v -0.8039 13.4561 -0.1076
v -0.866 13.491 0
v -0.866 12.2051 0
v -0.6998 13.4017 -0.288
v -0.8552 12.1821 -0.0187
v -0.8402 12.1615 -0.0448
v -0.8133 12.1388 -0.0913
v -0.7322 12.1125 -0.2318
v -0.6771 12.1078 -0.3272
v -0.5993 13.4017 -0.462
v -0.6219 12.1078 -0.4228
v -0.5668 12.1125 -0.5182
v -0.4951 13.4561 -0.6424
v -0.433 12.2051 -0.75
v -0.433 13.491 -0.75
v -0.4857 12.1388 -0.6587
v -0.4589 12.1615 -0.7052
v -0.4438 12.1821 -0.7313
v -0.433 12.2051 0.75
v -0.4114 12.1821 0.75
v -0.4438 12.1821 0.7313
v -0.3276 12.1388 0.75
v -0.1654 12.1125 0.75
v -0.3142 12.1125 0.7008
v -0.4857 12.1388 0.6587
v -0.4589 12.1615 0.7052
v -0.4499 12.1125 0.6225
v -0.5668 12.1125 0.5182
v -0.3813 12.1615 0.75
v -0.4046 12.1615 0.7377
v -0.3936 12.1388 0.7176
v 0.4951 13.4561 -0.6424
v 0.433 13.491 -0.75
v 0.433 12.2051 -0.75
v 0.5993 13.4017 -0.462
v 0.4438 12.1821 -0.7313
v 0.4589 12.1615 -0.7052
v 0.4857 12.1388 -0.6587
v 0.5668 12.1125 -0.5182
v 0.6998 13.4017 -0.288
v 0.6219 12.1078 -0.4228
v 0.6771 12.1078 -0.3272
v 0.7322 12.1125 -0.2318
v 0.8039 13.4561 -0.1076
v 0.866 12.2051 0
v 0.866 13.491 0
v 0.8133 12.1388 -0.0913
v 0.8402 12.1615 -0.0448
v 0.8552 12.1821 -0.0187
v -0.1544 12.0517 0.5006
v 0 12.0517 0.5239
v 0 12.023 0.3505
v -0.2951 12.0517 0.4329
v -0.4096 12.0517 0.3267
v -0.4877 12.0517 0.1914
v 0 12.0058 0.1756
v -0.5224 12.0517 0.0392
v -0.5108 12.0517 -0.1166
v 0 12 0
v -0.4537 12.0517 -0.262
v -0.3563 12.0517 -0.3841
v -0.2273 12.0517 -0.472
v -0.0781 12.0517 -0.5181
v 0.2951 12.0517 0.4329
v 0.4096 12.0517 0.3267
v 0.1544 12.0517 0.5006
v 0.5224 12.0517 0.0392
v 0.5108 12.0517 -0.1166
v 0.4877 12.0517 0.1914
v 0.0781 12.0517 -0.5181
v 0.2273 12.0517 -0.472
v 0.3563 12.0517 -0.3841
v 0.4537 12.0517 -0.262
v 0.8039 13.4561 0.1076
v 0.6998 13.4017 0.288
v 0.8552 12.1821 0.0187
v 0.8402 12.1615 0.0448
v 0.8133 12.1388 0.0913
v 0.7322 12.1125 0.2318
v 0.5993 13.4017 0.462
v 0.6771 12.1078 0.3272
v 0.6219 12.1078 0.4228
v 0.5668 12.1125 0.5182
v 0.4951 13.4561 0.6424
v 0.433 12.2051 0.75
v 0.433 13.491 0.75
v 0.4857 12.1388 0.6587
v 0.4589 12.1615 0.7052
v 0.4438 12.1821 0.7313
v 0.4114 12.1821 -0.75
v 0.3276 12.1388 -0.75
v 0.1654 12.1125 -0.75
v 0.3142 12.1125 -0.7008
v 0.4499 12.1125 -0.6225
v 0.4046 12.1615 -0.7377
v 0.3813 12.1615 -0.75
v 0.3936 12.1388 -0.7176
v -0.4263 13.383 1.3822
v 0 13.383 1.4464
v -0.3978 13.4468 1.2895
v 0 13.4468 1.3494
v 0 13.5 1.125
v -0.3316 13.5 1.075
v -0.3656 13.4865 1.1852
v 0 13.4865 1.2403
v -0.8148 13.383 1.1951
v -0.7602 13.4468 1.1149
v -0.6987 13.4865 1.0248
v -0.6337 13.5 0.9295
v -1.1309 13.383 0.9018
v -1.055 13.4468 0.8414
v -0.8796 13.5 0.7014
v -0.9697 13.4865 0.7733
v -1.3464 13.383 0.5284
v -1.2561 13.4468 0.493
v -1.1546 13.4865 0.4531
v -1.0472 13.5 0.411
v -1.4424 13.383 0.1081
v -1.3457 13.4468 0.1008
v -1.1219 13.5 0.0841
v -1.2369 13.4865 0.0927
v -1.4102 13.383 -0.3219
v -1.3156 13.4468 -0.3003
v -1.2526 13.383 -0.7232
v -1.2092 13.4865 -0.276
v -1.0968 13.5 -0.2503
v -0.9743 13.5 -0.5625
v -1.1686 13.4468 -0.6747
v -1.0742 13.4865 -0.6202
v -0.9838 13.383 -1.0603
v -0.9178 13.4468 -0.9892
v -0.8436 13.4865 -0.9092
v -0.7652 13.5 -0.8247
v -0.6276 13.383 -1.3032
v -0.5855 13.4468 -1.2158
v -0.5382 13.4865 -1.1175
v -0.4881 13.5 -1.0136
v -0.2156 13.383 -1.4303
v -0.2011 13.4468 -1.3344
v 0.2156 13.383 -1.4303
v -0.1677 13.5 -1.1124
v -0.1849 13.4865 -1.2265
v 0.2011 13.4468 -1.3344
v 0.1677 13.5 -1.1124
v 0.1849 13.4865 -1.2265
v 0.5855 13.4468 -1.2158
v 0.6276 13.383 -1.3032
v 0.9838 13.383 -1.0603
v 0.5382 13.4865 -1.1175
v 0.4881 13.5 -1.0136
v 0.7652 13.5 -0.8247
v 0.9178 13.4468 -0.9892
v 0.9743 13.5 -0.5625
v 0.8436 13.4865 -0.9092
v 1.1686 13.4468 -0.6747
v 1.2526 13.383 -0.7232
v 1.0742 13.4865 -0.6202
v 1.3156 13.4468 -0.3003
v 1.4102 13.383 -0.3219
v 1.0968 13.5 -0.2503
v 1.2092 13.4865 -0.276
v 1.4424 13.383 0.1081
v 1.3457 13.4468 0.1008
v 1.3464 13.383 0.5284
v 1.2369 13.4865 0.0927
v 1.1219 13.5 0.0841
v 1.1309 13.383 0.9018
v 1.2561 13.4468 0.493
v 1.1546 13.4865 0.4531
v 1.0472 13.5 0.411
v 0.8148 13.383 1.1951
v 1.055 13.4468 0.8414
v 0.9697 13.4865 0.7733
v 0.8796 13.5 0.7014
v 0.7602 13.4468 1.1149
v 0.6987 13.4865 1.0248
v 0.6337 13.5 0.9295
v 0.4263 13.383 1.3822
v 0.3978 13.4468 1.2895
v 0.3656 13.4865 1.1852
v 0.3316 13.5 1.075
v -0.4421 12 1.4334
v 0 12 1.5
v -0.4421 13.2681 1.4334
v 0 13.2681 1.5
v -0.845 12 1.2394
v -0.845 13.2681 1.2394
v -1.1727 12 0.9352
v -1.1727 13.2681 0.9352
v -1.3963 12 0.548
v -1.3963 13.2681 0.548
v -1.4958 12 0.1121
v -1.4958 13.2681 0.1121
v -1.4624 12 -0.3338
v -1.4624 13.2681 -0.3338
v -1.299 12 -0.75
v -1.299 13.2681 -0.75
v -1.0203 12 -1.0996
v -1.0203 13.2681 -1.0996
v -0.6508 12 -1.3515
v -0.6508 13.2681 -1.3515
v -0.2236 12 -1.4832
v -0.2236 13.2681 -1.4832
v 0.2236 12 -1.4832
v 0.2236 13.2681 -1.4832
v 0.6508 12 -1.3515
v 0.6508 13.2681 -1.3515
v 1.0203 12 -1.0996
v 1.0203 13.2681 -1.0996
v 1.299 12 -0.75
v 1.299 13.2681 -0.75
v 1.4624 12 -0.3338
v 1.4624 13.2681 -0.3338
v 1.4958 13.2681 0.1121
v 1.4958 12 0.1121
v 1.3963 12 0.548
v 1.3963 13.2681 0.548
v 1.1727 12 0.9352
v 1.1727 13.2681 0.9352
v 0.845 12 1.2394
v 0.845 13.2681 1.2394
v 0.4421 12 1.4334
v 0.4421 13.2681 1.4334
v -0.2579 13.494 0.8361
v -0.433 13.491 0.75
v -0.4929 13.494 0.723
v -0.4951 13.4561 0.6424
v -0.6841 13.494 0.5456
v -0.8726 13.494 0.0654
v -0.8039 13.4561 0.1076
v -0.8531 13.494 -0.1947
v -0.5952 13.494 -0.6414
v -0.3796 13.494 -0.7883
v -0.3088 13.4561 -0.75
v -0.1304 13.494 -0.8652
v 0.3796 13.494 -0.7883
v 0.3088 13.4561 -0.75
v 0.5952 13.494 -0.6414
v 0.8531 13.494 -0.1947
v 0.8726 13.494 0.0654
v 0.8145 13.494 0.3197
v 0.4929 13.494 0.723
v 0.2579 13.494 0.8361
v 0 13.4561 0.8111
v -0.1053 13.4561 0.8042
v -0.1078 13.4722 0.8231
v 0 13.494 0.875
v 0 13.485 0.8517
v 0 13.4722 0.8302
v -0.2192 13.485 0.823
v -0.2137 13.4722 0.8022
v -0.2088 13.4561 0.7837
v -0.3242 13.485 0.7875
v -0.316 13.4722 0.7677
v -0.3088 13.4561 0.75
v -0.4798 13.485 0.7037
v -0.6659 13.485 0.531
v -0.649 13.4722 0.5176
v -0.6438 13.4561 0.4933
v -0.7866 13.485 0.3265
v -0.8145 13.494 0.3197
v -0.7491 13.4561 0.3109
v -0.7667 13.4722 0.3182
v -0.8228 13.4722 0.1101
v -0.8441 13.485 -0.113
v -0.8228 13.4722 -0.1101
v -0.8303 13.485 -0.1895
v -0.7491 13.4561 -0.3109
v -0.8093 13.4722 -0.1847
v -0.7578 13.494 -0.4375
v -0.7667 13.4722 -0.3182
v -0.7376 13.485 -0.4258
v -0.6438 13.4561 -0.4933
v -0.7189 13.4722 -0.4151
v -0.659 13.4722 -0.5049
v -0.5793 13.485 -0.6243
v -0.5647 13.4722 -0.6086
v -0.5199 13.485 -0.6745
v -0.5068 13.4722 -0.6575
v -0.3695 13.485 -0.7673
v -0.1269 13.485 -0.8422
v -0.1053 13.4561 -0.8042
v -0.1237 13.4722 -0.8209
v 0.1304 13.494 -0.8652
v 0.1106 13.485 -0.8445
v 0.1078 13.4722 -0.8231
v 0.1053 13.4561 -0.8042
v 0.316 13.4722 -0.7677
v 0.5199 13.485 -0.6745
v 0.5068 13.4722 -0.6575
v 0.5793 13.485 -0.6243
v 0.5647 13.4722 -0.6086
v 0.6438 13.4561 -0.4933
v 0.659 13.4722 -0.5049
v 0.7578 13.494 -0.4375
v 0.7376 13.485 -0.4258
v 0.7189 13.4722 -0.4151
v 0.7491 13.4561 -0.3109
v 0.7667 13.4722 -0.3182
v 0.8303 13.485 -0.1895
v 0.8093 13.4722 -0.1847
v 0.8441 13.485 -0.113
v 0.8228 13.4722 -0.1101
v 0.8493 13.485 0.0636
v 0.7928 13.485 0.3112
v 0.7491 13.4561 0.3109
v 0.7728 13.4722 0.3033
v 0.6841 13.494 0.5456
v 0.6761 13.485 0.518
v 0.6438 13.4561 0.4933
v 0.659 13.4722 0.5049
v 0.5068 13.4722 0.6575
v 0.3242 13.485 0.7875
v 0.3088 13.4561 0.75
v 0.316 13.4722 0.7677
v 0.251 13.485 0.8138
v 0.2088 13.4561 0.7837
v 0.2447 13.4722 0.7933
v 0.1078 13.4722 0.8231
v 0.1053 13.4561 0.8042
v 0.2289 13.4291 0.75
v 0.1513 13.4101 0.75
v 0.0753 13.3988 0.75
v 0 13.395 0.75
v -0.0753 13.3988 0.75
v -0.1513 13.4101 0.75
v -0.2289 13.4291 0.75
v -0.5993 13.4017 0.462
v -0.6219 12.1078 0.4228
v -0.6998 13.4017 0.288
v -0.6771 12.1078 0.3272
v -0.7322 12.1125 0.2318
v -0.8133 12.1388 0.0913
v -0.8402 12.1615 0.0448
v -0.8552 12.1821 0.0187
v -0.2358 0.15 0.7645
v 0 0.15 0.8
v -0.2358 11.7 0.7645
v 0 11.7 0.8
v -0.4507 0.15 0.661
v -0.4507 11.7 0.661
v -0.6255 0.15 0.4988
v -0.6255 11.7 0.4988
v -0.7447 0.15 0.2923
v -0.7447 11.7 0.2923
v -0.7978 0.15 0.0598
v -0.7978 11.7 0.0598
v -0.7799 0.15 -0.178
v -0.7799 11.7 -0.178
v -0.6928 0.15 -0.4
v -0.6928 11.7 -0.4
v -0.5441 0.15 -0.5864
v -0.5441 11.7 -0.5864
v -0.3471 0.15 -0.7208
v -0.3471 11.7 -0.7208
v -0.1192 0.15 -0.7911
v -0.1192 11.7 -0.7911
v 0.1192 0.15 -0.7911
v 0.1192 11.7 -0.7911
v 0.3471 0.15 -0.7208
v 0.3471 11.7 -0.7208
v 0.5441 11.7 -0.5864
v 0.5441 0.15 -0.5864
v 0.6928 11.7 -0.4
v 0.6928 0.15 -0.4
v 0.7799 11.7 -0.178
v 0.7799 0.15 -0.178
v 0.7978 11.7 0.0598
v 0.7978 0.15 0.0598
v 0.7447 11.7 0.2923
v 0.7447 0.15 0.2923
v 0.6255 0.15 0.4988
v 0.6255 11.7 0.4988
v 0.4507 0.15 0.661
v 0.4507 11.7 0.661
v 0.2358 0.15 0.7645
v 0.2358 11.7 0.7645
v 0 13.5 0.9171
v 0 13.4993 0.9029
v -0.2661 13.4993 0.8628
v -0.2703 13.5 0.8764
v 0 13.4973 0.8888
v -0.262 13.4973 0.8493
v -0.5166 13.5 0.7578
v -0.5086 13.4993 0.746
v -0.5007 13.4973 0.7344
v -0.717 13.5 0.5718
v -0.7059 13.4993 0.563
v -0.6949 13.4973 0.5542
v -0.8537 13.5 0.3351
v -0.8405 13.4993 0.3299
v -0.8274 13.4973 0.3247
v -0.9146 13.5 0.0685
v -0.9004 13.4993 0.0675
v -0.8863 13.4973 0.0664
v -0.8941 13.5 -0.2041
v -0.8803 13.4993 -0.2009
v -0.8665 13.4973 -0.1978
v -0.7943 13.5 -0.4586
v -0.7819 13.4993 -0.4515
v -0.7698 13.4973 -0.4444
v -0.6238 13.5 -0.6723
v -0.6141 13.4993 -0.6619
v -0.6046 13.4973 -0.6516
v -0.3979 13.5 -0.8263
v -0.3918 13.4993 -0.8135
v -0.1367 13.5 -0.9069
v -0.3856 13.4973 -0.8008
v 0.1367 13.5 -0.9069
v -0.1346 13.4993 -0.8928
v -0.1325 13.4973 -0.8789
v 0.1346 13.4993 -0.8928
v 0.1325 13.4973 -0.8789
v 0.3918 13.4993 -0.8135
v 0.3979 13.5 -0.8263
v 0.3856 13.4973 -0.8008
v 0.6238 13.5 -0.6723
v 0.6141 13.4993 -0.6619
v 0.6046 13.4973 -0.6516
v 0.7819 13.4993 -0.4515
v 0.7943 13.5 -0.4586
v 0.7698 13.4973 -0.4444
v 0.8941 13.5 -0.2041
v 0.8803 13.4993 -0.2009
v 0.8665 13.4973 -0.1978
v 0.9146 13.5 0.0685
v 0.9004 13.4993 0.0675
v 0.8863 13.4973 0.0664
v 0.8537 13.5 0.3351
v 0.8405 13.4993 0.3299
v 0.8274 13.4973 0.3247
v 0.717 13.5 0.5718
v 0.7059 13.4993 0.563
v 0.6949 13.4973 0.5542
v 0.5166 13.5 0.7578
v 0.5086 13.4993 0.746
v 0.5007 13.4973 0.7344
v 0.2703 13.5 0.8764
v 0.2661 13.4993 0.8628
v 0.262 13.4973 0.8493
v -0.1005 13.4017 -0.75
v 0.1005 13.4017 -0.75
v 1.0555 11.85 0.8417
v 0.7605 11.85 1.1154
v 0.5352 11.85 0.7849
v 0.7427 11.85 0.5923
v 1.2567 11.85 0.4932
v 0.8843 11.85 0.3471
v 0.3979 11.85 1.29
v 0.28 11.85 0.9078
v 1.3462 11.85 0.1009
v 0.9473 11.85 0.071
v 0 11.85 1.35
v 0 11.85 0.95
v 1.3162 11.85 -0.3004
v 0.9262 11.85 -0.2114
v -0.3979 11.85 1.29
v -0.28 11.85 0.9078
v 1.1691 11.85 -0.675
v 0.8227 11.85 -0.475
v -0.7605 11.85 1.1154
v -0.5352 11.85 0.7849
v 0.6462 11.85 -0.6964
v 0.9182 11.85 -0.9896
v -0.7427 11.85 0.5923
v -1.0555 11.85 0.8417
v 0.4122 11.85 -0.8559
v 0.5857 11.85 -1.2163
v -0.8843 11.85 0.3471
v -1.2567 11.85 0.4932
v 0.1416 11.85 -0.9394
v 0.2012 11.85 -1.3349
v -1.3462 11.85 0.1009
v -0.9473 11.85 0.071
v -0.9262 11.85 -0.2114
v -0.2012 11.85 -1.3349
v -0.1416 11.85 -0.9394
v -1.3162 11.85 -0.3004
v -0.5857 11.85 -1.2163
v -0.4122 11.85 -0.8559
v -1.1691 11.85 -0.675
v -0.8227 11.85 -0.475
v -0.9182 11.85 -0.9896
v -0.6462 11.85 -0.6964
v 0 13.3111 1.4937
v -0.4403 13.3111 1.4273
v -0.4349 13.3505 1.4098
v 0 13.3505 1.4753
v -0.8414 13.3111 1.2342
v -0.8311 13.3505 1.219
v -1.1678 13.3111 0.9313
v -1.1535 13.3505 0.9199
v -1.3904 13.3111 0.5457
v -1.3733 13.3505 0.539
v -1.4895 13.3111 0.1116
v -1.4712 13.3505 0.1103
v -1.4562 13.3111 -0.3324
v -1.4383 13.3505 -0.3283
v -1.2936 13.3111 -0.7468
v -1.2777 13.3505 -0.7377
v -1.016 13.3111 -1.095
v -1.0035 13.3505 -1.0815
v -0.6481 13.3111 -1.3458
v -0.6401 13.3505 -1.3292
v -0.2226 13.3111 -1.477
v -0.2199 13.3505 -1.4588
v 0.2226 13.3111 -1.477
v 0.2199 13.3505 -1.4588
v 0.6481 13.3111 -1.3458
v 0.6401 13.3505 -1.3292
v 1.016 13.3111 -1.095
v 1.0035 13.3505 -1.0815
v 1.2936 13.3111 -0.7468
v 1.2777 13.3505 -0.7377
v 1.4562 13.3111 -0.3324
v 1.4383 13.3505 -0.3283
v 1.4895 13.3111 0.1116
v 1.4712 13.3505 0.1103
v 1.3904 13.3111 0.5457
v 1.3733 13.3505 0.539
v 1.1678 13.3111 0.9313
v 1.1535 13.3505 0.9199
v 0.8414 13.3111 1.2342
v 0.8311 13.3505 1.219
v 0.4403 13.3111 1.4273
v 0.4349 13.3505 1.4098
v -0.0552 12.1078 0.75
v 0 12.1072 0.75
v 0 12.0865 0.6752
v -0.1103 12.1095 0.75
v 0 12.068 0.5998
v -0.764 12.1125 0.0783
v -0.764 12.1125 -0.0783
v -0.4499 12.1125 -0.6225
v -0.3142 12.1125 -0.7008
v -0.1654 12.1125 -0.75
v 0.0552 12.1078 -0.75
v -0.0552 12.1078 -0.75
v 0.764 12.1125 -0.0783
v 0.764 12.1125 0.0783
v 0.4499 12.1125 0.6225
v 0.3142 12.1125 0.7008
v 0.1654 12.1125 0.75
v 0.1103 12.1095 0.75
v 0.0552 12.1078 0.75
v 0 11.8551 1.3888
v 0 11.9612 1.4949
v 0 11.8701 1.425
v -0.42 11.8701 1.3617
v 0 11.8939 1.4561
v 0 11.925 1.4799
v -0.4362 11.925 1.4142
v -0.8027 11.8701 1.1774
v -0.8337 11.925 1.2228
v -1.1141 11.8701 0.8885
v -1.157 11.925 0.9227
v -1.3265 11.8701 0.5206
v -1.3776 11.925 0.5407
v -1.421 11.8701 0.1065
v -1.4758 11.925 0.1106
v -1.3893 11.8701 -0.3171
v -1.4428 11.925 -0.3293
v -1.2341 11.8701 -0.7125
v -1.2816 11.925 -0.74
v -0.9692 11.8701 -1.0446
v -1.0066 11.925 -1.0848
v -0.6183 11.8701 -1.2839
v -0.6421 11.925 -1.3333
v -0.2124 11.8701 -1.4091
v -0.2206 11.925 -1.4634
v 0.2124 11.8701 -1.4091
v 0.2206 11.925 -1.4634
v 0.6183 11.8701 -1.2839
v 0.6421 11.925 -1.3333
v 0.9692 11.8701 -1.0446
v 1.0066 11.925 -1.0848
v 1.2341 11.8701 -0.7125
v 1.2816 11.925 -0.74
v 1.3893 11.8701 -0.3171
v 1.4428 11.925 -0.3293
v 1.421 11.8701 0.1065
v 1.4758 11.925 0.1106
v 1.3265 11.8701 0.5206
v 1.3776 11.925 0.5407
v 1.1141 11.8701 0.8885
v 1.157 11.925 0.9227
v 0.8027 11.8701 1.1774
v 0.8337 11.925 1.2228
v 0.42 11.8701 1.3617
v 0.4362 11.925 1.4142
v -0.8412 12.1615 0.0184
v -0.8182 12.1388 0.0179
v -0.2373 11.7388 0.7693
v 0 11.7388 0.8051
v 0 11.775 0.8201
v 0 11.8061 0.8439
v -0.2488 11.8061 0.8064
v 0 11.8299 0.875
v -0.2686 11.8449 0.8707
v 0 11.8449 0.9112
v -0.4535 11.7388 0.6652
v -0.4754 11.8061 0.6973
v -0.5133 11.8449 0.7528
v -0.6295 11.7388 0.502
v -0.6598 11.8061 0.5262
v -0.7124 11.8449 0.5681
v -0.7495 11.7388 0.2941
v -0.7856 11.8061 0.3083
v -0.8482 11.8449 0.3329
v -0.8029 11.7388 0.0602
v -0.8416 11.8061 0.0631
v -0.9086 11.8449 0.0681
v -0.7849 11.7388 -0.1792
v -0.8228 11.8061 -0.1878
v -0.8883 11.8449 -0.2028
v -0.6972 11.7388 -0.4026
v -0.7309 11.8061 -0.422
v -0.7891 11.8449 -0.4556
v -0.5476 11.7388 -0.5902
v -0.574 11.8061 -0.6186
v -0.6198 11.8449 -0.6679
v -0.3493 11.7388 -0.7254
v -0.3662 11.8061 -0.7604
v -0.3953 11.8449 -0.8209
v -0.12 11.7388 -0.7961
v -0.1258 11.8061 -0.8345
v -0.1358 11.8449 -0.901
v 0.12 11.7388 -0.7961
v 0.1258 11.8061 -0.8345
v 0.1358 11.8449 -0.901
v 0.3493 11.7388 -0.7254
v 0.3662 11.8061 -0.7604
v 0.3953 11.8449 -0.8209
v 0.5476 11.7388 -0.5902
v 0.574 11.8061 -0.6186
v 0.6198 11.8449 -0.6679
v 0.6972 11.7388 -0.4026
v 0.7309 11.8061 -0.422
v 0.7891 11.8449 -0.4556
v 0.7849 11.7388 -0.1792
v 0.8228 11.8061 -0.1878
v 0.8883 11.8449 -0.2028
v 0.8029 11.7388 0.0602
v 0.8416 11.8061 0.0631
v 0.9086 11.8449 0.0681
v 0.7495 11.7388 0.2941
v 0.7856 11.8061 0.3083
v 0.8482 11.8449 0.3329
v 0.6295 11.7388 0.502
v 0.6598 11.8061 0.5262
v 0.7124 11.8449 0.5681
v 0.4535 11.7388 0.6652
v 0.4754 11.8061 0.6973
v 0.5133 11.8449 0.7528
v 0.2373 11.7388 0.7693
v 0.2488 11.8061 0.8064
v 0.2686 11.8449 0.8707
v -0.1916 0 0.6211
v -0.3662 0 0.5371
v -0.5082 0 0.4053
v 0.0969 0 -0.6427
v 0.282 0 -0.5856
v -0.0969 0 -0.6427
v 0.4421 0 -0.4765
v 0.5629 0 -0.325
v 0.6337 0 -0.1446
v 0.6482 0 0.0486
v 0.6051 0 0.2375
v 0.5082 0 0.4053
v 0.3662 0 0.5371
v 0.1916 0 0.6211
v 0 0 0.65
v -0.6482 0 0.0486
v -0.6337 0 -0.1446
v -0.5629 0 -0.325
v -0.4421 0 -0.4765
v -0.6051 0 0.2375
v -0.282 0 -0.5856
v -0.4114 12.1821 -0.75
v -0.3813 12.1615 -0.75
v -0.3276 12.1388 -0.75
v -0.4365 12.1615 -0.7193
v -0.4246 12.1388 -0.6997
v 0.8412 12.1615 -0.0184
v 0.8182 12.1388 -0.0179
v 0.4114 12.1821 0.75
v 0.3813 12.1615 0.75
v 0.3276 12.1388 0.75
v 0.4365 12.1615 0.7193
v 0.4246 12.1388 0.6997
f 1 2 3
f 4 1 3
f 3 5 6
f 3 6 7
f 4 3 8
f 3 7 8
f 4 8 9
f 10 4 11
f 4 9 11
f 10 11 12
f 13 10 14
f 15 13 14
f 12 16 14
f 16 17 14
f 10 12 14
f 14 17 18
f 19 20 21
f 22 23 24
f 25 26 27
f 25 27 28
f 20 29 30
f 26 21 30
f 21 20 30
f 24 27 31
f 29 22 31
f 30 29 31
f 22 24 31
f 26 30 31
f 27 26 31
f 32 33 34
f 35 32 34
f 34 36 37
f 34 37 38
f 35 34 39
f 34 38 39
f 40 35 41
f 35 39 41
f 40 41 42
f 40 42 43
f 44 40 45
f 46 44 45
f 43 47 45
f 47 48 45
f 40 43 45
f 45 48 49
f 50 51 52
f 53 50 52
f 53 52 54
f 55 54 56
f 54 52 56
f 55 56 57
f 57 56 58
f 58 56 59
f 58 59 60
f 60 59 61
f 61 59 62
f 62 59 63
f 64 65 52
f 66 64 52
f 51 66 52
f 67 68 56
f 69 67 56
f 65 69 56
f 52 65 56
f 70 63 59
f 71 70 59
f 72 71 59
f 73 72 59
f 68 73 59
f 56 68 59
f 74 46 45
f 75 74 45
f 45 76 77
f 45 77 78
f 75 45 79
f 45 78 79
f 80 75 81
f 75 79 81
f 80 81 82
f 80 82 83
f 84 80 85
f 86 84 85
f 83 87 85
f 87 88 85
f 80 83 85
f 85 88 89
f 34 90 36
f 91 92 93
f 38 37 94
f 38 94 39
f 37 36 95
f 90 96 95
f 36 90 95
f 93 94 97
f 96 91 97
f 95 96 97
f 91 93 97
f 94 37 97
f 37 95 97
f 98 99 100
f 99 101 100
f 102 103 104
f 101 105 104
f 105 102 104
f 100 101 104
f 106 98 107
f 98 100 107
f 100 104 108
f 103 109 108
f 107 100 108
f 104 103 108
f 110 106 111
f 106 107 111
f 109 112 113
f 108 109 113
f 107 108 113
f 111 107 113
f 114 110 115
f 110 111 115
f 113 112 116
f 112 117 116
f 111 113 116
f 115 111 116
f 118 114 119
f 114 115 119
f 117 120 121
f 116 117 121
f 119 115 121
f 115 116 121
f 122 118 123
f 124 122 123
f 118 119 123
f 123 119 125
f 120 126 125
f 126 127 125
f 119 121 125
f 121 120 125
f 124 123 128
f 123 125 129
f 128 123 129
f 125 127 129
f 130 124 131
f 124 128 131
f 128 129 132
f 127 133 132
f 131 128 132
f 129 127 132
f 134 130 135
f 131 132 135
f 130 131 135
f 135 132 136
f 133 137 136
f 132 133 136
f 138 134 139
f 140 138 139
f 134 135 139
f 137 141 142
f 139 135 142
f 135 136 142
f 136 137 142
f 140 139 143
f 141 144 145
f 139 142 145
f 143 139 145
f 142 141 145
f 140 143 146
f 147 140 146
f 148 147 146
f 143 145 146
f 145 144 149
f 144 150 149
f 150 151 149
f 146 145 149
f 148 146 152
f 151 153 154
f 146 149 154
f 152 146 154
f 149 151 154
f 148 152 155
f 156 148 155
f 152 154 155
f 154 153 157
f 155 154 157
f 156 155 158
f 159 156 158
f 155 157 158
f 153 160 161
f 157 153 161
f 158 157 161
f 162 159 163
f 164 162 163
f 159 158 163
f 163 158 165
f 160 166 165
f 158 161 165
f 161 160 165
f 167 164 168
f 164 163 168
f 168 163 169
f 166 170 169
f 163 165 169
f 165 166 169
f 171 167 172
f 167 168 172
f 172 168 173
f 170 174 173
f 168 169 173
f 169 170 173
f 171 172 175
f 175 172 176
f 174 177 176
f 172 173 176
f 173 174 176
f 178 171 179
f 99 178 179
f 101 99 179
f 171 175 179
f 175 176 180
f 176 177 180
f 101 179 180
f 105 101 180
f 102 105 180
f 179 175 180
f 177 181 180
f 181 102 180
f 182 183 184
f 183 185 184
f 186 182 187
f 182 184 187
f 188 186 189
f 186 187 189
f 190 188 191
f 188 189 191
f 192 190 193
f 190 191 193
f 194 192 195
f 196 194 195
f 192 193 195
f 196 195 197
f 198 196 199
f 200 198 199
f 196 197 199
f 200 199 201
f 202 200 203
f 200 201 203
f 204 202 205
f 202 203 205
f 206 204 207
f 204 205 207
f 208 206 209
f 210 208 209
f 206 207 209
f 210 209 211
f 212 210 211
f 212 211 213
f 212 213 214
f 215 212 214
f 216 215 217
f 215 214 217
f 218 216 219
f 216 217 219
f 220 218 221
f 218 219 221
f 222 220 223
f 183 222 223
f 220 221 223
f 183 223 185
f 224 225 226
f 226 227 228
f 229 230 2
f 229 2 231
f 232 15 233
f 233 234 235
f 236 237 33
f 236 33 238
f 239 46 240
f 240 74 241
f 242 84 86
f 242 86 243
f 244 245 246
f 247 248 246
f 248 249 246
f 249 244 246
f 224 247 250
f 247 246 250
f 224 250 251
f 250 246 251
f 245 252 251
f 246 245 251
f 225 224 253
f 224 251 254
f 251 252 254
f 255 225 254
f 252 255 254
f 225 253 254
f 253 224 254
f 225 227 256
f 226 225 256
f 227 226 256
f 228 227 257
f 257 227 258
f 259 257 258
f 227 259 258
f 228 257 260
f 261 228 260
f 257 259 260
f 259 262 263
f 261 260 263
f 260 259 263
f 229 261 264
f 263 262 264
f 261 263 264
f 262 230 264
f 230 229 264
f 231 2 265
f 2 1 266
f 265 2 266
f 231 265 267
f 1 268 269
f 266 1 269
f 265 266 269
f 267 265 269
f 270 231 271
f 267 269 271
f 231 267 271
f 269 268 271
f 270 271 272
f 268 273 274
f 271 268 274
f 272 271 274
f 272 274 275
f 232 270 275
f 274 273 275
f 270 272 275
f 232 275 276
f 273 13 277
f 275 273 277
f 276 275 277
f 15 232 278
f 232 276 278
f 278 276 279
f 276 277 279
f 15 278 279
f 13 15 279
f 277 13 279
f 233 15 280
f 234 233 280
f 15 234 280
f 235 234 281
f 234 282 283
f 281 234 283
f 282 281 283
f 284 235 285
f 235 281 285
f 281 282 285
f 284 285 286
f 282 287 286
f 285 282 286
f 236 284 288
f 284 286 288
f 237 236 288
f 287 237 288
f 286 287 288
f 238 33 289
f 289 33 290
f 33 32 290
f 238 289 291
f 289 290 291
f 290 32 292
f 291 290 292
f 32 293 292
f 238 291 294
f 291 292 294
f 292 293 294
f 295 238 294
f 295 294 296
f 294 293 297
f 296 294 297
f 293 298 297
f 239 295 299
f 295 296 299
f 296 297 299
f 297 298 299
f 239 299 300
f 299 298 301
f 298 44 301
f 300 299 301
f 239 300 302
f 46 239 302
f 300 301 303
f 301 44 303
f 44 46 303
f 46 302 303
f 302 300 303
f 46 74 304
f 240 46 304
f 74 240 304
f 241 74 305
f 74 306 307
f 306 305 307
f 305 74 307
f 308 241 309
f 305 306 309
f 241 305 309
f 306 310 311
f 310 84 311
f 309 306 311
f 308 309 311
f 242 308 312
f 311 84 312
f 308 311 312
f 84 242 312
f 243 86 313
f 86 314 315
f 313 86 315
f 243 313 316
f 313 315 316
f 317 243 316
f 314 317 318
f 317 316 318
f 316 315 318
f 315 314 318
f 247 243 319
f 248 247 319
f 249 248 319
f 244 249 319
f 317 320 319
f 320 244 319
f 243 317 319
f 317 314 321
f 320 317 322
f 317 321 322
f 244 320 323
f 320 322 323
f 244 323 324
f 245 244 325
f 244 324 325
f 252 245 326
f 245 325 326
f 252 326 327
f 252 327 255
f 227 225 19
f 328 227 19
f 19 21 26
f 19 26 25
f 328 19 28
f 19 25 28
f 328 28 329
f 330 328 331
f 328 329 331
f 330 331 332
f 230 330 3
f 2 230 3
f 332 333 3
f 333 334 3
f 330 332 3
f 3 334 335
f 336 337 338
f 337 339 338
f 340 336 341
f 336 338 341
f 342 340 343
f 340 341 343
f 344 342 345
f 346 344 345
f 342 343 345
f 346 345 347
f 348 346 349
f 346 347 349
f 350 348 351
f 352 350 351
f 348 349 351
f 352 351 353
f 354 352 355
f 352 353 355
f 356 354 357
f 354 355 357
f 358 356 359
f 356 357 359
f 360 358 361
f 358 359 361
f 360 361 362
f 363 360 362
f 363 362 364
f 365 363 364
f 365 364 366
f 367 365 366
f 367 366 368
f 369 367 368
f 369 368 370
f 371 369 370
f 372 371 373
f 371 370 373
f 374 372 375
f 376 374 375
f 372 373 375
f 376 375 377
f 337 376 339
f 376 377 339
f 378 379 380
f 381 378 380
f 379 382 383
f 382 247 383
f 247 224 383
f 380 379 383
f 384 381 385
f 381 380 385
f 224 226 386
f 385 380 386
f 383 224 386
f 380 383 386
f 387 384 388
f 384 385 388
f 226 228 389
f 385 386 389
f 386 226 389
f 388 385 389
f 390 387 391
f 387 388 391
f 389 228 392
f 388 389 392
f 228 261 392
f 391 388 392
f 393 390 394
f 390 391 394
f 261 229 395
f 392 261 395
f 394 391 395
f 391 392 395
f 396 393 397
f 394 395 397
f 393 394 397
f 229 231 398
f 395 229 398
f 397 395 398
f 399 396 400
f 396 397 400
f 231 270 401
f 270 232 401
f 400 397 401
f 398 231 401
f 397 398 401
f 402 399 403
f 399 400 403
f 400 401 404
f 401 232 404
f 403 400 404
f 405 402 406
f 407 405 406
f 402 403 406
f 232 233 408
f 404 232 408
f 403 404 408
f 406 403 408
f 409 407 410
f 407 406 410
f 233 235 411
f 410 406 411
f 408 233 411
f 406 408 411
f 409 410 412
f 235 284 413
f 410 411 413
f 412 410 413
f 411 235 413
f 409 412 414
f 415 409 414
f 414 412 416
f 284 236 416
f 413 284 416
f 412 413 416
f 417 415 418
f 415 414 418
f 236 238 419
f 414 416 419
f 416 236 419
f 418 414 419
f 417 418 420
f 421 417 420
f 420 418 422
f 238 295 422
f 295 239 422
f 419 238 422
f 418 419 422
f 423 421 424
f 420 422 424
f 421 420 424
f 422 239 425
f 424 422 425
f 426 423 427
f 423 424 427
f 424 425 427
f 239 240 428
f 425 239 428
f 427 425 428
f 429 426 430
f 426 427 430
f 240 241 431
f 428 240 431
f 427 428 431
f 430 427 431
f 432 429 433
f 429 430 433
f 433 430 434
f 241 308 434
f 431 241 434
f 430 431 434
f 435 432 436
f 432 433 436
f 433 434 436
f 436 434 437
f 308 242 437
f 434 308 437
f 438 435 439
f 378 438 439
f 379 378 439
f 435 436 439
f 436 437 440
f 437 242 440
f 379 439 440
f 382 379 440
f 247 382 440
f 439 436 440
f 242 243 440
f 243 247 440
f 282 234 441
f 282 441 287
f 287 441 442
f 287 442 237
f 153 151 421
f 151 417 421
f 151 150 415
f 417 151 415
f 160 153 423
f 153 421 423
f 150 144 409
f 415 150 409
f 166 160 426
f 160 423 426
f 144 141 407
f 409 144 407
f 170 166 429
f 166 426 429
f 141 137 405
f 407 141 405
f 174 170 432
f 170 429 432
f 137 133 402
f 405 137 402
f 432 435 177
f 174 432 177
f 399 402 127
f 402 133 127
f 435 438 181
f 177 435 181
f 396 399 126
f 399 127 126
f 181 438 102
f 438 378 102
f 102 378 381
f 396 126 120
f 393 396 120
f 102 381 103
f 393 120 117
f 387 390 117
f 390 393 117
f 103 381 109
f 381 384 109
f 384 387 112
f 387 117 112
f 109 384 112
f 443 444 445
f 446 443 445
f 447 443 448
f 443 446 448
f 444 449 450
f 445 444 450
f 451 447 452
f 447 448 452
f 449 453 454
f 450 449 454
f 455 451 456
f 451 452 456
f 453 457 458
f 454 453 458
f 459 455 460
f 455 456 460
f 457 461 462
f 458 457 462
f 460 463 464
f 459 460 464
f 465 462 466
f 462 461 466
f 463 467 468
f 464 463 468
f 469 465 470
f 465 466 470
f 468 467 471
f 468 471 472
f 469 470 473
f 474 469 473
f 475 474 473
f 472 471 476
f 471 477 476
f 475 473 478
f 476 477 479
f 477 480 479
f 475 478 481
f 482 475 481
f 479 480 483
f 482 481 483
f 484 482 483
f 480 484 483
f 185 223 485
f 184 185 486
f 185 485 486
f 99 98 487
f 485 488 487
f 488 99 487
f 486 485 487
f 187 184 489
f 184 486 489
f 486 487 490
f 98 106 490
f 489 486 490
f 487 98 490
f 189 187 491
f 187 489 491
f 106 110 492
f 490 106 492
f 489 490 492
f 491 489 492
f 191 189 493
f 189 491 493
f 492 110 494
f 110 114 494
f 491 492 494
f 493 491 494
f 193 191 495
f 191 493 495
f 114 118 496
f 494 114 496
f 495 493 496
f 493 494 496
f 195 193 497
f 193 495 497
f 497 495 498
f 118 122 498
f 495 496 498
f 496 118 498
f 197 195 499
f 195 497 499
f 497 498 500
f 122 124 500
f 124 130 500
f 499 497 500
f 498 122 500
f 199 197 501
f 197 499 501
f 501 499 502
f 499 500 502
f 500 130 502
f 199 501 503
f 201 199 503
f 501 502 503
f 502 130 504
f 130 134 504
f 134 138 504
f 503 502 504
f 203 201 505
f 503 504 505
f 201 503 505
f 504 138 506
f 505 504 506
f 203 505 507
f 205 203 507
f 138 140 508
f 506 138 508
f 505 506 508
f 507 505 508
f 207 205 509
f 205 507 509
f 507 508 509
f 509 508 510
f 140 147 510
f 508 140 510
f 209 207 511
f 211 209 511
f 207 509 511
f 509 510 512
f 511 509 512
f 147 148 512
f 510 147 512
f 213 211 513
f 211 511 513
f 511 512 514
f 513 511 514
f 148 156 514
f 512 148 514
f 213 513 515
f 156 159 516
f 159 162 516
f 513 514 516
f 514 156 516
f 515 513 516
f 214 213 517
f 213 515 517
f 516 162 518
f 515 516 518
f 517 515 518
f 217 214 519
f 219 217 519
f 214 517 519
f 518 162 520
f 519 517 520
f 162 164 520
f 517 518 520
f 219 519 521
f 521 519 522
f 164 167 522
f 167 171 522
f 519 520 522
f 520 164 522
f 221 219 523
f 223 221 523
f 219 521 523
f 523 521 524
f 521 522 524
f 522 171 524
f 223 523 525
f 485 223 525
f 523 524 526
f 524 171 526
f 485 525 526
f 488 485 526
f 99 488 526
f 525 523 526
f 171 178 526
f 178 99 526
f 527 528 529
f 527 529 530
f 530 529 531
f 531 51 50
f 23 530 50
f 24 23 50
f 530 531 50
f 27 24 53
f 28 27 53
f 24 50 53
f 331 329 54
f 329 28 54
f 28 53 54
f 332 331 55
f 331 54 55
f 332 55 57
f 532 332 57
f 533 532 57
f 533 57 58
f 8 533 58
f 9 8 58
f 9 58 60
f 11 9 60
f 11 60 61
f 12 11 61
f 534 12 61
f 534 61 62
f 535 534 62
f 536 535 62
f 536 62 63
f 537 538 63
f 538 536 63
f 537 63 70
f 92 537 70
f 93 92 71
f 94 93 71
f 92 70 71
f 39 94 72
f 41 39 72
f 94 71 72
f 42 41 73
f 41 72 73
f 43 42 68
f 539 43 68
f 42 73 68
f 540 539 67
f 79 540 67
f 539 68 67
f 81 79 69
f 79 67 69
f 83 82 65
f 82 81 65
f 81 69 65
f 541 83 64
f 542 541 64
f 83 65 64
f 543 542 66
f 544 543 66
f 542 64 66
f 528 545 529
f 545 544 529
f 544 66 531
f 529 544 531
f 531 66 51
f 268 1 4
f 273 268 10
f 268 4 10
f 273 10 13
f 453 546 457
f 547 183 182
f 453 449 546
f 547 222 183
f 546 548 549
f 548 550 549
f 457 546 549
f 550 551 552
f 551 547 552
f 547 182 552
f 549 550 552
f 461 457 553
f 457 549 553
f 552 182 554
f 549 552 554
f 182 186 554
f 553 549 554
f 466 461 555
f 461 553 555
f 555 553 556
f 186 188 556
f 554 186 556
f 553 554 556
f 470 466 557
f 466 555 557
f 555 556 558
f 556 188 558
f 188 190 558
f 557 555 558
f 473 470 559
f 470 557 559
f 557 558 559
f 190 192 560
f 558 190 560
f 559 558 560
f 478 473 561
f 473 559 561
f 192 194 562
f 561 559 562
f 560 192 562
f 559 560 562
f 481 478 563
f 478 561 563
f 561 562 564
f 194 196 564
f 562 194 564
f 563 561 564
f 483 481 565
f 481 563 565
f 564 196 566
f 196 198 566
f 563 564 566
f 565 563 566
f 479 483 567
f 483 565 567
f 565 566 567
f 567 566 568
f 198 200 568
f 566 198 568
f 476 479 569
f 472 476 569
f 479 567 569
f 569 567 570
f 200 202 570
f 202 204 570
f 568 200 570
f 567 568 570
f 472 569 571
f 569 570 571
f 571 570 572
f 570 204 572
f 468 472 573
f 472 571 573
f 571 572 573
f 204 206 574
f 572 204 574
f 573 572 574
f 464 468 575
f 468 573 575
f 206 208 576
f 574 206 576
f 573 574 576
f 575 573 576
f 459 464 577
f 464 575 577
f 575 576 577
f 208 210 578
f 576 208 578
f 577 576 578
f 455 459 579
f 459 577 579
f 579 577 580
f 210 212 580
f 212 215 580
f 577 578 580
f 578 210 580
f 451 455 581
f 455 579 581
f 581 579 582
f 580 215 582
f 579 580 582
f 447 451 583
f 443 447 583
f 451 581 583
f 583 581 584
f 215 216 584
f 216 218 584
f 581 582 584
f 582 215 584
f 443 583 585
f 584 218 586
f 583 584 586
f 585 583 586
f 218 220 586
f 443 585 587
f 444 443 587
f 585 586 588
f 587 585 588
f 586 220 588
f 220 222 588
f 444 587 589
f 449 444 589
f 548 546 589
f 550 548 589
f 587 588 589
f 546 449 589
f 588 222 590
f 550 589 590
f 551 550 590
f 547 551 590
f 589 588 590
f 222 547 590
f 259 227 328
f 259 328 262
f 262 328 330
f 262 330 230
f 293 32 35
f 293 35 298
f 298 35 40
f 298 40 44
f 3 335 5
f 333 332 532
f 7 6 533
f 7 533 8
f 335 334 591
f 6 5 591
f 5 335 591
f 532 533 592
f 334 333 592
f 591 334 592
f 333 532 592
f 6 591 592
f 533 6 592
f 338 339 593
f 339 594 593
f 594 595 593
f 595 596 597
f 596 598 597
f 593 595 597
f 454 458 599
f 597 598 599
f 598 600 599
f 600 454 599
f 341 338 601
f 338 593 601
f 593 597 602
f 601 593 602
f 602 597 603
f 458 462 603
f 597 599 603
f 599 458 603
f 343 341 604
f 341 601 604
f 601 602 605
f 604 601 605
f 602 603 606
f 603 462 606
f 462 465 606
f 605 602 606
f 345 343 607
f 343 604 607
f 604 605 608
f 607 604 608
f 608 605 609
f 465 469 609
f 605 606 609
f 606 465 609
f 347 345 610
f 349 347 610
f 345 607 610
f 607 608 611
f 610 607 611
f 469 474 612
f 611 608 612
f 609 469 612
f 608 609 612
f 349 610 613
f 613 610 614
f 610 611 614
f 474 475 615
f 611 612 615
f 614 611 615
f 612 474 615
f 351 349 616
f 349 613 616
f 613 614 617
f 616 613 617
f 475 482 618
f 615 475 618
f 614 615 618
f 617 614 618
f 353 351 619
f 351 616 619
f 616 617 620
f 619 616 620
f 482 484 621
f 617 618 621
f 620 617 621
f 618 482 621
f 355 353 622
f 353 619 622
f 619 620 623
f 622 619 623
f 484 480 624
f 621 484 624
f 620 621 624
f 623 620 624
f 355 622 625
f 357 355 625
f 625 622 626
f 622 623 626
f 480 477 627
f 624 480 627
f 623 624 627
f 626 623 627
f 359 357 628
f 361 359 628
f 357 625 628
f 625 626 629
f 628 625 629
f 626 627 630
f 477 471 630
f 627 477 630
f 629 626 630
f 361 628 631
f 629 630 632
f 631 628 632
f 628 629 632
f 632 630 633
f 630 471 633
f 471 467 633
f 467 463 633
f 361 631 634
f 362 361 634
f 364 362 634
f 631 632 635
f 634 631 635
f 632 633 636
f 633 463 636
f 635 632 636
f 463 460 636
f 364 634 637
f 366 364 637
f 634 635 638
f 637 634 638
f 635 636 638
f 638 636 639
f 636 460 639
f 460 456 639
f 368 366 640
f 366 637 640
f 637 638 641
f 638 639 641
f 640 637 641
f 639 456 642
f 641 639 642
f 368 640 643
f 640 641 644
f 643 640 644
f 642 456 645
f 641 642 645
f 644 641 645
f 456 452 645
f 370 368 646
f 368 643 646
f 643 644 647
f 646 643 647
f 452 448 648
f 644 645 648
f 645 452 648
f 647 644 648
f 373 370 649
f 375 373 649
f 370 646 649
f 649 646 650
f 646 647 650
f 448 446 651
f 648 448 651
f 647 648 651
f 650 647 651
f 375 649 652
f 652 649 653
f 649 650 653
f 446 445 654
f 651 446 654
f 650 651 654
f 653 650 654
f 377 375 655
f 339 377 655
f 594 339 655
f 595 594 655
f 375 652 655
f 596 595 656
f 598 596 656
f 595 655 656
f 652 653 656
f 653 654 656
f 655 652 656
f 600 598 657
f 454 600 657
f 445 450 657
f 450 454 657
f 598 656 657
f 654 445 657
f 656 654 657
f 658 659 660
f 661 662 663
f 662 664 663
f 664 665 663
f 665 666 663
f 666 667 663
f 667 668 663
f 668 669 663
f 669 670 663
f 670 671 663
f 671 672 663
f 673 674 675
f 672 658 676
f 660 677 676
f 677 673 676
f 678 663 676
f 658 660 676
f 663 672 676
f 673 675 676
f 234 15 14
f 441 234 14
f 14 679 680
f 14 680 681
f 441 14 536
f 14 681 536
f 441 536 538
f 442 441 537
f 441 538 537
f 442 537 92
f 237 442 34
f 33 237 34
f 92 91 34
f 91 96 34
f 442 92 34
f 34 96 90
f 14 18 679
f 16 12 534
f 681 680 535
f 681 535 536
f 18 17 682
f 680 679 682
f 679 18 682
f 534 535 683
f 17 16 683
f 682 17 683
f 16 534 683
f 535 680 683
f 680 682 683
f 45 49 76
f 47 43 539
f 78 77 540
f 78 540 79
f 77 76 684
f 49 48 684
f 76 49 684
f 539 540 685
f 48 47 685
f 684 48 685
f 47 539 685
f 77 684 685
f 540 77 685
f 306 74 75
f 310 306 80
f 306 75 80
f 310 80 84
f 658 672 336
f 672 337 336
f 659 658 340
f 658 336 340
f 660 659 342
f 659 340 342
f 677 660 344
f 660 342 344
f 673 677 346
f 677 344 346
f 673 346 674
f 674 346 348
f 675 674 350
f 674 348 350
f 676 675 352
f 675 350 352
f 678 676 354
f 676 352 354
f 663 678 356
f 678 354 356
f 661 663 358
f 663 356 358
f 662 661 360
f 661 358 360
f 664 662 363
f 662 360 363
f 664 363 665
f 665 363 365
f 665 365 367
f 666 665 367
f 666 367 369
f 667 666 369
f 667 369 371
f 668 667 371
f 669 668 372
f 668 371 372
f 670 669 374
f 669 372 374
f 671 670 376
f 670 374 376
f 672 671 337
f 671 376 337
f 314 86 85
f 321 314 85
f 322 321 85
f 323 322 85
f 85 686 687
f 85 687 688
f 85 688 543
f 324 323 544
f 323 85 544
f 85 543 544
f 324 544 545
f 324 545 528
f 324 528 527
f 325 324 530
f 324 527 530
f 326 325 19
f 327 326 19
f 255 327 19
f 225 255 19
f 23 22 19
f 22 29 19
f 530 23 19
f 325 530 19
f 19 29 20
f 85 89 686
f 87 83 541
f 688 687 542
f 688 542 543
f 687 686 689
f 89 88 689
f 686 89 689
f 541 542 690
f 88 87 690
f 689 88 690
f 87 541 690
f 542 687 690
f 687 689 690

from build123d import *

# Parameters (mm, degrees)
CUT_EXTRUDE2_DEPTH = 13.038376161


with BuildPart() as part:
    # Sketch1 → Revolve1 (revolve)
    with BuildSketch(Plane(origin=(0, 0, 0), x_dir=(0, 0, -1), z_dir=(1, 0, 0))):
        with BuildLine():
            ThreePointArc((0.8, 11.7), (0.843933983, 11.806066017), (0.95, 11.85))
            Line((0.95, 11.85), (1.35, 11.85))
            ThreePointArc((1.35, 11.85), (1.456066017, 11.893933983), (1.5, 12))
            Line((1.5, 12), (1.5, 13.268095132))
            ThreePointArc((1.5, 13.268095132), (1.485949045, 13.331481701), (1.446428571, 13.382993046))
            ThreePointArc((1.446428571, 13.382993046), (1.296031396, 13.469838548), (1.125, 13.5))
            Line((1.125, 13.5), (0.917132034, 13.5))
            ThreePointArc((0.917132034, 13.5), (0.895850747, 13.498482682), (0.875, 13.493961424))
            Line((0.875, 13.493961424), (0.875, 12.256185485))
            ThreePointArc((0.875, 12.256185485), (0.845317103, 12.166609847), (0.768016069, 12.112485736))
            ThreePointArc((0.768016069, 12.112485736), (0.646674627, 12.079247272), (0.523906049, 12.051744226))
            ThreePointArc((0.523906049, 12.051744226), (0.263227569, 12.012967451), (0, 12))
            Line((0, 12), (0, 0))
            Line((0, 0), (0.65, 0))
            Line((0.65, 0), (0.8, 0.15))
            Line((0.8, 0.15), (0.8, 11.7))
        make_face()
    revolve(axis=Axis((0, 13.5, 0), (0, -1, 0)))


with BuildPart() as body_2:
    # Sketch1<3> → Revolve2 (revolve)
    with BuildSketch(Plane(origin=(0, 0, 0), x_dir=(0, 0, -1), z_dir=(1, 0, 0))):
        with BuildLine():
            ThreePointArc((0.725, 12.29691396), (0.668295774, 12.138368245), (0.523906049, 12.051744226))
            ThreePointArc((0.523906049, 12.051744226), (0.646674627, 12.079247272), (0.768016069, 12.112485736))
            ThreePointArc((0.768016069, 12.112485736), (0.845317103, 12.166609847), (0.875, 12.256185485))
            Line((0.875, 12.256185485), (0.875, 13.493961424))
            ThreePointArc((0.875, 13.493961424), (0.840648826, 13.479036115), (0.811066017, 13.456066017))
            Line((0.811066017, 13.456066017), (0.725, 13.37))
            Line((0.725, 13.37), (0.725, 12.29691396))
        make_face()
    revolve(axis=Axis((0, 13.5, 0), (0, -1, 0)))

    # Sketch2 → Cut-Extrude2 (cut, through all)
    with BuildSketch(Plane.XZ.offset(-11.85)):
        Polygon((-0.433012702, 0.75), (-0.866025404, 0), (-0.433012702, -0.75), (0.433012702, -0.75), (0.866025404, 0), (0.433012702, 0.75), align=None)
    extrude(amount=-CUT_EXTRUDE2_DEPTH, mode=Mode.SUBTRACT)


with BuildPart() as part_1:
    add(part.part)

    # Combine1: union body 2
    add(body_2.part)


solid = part_1.part
